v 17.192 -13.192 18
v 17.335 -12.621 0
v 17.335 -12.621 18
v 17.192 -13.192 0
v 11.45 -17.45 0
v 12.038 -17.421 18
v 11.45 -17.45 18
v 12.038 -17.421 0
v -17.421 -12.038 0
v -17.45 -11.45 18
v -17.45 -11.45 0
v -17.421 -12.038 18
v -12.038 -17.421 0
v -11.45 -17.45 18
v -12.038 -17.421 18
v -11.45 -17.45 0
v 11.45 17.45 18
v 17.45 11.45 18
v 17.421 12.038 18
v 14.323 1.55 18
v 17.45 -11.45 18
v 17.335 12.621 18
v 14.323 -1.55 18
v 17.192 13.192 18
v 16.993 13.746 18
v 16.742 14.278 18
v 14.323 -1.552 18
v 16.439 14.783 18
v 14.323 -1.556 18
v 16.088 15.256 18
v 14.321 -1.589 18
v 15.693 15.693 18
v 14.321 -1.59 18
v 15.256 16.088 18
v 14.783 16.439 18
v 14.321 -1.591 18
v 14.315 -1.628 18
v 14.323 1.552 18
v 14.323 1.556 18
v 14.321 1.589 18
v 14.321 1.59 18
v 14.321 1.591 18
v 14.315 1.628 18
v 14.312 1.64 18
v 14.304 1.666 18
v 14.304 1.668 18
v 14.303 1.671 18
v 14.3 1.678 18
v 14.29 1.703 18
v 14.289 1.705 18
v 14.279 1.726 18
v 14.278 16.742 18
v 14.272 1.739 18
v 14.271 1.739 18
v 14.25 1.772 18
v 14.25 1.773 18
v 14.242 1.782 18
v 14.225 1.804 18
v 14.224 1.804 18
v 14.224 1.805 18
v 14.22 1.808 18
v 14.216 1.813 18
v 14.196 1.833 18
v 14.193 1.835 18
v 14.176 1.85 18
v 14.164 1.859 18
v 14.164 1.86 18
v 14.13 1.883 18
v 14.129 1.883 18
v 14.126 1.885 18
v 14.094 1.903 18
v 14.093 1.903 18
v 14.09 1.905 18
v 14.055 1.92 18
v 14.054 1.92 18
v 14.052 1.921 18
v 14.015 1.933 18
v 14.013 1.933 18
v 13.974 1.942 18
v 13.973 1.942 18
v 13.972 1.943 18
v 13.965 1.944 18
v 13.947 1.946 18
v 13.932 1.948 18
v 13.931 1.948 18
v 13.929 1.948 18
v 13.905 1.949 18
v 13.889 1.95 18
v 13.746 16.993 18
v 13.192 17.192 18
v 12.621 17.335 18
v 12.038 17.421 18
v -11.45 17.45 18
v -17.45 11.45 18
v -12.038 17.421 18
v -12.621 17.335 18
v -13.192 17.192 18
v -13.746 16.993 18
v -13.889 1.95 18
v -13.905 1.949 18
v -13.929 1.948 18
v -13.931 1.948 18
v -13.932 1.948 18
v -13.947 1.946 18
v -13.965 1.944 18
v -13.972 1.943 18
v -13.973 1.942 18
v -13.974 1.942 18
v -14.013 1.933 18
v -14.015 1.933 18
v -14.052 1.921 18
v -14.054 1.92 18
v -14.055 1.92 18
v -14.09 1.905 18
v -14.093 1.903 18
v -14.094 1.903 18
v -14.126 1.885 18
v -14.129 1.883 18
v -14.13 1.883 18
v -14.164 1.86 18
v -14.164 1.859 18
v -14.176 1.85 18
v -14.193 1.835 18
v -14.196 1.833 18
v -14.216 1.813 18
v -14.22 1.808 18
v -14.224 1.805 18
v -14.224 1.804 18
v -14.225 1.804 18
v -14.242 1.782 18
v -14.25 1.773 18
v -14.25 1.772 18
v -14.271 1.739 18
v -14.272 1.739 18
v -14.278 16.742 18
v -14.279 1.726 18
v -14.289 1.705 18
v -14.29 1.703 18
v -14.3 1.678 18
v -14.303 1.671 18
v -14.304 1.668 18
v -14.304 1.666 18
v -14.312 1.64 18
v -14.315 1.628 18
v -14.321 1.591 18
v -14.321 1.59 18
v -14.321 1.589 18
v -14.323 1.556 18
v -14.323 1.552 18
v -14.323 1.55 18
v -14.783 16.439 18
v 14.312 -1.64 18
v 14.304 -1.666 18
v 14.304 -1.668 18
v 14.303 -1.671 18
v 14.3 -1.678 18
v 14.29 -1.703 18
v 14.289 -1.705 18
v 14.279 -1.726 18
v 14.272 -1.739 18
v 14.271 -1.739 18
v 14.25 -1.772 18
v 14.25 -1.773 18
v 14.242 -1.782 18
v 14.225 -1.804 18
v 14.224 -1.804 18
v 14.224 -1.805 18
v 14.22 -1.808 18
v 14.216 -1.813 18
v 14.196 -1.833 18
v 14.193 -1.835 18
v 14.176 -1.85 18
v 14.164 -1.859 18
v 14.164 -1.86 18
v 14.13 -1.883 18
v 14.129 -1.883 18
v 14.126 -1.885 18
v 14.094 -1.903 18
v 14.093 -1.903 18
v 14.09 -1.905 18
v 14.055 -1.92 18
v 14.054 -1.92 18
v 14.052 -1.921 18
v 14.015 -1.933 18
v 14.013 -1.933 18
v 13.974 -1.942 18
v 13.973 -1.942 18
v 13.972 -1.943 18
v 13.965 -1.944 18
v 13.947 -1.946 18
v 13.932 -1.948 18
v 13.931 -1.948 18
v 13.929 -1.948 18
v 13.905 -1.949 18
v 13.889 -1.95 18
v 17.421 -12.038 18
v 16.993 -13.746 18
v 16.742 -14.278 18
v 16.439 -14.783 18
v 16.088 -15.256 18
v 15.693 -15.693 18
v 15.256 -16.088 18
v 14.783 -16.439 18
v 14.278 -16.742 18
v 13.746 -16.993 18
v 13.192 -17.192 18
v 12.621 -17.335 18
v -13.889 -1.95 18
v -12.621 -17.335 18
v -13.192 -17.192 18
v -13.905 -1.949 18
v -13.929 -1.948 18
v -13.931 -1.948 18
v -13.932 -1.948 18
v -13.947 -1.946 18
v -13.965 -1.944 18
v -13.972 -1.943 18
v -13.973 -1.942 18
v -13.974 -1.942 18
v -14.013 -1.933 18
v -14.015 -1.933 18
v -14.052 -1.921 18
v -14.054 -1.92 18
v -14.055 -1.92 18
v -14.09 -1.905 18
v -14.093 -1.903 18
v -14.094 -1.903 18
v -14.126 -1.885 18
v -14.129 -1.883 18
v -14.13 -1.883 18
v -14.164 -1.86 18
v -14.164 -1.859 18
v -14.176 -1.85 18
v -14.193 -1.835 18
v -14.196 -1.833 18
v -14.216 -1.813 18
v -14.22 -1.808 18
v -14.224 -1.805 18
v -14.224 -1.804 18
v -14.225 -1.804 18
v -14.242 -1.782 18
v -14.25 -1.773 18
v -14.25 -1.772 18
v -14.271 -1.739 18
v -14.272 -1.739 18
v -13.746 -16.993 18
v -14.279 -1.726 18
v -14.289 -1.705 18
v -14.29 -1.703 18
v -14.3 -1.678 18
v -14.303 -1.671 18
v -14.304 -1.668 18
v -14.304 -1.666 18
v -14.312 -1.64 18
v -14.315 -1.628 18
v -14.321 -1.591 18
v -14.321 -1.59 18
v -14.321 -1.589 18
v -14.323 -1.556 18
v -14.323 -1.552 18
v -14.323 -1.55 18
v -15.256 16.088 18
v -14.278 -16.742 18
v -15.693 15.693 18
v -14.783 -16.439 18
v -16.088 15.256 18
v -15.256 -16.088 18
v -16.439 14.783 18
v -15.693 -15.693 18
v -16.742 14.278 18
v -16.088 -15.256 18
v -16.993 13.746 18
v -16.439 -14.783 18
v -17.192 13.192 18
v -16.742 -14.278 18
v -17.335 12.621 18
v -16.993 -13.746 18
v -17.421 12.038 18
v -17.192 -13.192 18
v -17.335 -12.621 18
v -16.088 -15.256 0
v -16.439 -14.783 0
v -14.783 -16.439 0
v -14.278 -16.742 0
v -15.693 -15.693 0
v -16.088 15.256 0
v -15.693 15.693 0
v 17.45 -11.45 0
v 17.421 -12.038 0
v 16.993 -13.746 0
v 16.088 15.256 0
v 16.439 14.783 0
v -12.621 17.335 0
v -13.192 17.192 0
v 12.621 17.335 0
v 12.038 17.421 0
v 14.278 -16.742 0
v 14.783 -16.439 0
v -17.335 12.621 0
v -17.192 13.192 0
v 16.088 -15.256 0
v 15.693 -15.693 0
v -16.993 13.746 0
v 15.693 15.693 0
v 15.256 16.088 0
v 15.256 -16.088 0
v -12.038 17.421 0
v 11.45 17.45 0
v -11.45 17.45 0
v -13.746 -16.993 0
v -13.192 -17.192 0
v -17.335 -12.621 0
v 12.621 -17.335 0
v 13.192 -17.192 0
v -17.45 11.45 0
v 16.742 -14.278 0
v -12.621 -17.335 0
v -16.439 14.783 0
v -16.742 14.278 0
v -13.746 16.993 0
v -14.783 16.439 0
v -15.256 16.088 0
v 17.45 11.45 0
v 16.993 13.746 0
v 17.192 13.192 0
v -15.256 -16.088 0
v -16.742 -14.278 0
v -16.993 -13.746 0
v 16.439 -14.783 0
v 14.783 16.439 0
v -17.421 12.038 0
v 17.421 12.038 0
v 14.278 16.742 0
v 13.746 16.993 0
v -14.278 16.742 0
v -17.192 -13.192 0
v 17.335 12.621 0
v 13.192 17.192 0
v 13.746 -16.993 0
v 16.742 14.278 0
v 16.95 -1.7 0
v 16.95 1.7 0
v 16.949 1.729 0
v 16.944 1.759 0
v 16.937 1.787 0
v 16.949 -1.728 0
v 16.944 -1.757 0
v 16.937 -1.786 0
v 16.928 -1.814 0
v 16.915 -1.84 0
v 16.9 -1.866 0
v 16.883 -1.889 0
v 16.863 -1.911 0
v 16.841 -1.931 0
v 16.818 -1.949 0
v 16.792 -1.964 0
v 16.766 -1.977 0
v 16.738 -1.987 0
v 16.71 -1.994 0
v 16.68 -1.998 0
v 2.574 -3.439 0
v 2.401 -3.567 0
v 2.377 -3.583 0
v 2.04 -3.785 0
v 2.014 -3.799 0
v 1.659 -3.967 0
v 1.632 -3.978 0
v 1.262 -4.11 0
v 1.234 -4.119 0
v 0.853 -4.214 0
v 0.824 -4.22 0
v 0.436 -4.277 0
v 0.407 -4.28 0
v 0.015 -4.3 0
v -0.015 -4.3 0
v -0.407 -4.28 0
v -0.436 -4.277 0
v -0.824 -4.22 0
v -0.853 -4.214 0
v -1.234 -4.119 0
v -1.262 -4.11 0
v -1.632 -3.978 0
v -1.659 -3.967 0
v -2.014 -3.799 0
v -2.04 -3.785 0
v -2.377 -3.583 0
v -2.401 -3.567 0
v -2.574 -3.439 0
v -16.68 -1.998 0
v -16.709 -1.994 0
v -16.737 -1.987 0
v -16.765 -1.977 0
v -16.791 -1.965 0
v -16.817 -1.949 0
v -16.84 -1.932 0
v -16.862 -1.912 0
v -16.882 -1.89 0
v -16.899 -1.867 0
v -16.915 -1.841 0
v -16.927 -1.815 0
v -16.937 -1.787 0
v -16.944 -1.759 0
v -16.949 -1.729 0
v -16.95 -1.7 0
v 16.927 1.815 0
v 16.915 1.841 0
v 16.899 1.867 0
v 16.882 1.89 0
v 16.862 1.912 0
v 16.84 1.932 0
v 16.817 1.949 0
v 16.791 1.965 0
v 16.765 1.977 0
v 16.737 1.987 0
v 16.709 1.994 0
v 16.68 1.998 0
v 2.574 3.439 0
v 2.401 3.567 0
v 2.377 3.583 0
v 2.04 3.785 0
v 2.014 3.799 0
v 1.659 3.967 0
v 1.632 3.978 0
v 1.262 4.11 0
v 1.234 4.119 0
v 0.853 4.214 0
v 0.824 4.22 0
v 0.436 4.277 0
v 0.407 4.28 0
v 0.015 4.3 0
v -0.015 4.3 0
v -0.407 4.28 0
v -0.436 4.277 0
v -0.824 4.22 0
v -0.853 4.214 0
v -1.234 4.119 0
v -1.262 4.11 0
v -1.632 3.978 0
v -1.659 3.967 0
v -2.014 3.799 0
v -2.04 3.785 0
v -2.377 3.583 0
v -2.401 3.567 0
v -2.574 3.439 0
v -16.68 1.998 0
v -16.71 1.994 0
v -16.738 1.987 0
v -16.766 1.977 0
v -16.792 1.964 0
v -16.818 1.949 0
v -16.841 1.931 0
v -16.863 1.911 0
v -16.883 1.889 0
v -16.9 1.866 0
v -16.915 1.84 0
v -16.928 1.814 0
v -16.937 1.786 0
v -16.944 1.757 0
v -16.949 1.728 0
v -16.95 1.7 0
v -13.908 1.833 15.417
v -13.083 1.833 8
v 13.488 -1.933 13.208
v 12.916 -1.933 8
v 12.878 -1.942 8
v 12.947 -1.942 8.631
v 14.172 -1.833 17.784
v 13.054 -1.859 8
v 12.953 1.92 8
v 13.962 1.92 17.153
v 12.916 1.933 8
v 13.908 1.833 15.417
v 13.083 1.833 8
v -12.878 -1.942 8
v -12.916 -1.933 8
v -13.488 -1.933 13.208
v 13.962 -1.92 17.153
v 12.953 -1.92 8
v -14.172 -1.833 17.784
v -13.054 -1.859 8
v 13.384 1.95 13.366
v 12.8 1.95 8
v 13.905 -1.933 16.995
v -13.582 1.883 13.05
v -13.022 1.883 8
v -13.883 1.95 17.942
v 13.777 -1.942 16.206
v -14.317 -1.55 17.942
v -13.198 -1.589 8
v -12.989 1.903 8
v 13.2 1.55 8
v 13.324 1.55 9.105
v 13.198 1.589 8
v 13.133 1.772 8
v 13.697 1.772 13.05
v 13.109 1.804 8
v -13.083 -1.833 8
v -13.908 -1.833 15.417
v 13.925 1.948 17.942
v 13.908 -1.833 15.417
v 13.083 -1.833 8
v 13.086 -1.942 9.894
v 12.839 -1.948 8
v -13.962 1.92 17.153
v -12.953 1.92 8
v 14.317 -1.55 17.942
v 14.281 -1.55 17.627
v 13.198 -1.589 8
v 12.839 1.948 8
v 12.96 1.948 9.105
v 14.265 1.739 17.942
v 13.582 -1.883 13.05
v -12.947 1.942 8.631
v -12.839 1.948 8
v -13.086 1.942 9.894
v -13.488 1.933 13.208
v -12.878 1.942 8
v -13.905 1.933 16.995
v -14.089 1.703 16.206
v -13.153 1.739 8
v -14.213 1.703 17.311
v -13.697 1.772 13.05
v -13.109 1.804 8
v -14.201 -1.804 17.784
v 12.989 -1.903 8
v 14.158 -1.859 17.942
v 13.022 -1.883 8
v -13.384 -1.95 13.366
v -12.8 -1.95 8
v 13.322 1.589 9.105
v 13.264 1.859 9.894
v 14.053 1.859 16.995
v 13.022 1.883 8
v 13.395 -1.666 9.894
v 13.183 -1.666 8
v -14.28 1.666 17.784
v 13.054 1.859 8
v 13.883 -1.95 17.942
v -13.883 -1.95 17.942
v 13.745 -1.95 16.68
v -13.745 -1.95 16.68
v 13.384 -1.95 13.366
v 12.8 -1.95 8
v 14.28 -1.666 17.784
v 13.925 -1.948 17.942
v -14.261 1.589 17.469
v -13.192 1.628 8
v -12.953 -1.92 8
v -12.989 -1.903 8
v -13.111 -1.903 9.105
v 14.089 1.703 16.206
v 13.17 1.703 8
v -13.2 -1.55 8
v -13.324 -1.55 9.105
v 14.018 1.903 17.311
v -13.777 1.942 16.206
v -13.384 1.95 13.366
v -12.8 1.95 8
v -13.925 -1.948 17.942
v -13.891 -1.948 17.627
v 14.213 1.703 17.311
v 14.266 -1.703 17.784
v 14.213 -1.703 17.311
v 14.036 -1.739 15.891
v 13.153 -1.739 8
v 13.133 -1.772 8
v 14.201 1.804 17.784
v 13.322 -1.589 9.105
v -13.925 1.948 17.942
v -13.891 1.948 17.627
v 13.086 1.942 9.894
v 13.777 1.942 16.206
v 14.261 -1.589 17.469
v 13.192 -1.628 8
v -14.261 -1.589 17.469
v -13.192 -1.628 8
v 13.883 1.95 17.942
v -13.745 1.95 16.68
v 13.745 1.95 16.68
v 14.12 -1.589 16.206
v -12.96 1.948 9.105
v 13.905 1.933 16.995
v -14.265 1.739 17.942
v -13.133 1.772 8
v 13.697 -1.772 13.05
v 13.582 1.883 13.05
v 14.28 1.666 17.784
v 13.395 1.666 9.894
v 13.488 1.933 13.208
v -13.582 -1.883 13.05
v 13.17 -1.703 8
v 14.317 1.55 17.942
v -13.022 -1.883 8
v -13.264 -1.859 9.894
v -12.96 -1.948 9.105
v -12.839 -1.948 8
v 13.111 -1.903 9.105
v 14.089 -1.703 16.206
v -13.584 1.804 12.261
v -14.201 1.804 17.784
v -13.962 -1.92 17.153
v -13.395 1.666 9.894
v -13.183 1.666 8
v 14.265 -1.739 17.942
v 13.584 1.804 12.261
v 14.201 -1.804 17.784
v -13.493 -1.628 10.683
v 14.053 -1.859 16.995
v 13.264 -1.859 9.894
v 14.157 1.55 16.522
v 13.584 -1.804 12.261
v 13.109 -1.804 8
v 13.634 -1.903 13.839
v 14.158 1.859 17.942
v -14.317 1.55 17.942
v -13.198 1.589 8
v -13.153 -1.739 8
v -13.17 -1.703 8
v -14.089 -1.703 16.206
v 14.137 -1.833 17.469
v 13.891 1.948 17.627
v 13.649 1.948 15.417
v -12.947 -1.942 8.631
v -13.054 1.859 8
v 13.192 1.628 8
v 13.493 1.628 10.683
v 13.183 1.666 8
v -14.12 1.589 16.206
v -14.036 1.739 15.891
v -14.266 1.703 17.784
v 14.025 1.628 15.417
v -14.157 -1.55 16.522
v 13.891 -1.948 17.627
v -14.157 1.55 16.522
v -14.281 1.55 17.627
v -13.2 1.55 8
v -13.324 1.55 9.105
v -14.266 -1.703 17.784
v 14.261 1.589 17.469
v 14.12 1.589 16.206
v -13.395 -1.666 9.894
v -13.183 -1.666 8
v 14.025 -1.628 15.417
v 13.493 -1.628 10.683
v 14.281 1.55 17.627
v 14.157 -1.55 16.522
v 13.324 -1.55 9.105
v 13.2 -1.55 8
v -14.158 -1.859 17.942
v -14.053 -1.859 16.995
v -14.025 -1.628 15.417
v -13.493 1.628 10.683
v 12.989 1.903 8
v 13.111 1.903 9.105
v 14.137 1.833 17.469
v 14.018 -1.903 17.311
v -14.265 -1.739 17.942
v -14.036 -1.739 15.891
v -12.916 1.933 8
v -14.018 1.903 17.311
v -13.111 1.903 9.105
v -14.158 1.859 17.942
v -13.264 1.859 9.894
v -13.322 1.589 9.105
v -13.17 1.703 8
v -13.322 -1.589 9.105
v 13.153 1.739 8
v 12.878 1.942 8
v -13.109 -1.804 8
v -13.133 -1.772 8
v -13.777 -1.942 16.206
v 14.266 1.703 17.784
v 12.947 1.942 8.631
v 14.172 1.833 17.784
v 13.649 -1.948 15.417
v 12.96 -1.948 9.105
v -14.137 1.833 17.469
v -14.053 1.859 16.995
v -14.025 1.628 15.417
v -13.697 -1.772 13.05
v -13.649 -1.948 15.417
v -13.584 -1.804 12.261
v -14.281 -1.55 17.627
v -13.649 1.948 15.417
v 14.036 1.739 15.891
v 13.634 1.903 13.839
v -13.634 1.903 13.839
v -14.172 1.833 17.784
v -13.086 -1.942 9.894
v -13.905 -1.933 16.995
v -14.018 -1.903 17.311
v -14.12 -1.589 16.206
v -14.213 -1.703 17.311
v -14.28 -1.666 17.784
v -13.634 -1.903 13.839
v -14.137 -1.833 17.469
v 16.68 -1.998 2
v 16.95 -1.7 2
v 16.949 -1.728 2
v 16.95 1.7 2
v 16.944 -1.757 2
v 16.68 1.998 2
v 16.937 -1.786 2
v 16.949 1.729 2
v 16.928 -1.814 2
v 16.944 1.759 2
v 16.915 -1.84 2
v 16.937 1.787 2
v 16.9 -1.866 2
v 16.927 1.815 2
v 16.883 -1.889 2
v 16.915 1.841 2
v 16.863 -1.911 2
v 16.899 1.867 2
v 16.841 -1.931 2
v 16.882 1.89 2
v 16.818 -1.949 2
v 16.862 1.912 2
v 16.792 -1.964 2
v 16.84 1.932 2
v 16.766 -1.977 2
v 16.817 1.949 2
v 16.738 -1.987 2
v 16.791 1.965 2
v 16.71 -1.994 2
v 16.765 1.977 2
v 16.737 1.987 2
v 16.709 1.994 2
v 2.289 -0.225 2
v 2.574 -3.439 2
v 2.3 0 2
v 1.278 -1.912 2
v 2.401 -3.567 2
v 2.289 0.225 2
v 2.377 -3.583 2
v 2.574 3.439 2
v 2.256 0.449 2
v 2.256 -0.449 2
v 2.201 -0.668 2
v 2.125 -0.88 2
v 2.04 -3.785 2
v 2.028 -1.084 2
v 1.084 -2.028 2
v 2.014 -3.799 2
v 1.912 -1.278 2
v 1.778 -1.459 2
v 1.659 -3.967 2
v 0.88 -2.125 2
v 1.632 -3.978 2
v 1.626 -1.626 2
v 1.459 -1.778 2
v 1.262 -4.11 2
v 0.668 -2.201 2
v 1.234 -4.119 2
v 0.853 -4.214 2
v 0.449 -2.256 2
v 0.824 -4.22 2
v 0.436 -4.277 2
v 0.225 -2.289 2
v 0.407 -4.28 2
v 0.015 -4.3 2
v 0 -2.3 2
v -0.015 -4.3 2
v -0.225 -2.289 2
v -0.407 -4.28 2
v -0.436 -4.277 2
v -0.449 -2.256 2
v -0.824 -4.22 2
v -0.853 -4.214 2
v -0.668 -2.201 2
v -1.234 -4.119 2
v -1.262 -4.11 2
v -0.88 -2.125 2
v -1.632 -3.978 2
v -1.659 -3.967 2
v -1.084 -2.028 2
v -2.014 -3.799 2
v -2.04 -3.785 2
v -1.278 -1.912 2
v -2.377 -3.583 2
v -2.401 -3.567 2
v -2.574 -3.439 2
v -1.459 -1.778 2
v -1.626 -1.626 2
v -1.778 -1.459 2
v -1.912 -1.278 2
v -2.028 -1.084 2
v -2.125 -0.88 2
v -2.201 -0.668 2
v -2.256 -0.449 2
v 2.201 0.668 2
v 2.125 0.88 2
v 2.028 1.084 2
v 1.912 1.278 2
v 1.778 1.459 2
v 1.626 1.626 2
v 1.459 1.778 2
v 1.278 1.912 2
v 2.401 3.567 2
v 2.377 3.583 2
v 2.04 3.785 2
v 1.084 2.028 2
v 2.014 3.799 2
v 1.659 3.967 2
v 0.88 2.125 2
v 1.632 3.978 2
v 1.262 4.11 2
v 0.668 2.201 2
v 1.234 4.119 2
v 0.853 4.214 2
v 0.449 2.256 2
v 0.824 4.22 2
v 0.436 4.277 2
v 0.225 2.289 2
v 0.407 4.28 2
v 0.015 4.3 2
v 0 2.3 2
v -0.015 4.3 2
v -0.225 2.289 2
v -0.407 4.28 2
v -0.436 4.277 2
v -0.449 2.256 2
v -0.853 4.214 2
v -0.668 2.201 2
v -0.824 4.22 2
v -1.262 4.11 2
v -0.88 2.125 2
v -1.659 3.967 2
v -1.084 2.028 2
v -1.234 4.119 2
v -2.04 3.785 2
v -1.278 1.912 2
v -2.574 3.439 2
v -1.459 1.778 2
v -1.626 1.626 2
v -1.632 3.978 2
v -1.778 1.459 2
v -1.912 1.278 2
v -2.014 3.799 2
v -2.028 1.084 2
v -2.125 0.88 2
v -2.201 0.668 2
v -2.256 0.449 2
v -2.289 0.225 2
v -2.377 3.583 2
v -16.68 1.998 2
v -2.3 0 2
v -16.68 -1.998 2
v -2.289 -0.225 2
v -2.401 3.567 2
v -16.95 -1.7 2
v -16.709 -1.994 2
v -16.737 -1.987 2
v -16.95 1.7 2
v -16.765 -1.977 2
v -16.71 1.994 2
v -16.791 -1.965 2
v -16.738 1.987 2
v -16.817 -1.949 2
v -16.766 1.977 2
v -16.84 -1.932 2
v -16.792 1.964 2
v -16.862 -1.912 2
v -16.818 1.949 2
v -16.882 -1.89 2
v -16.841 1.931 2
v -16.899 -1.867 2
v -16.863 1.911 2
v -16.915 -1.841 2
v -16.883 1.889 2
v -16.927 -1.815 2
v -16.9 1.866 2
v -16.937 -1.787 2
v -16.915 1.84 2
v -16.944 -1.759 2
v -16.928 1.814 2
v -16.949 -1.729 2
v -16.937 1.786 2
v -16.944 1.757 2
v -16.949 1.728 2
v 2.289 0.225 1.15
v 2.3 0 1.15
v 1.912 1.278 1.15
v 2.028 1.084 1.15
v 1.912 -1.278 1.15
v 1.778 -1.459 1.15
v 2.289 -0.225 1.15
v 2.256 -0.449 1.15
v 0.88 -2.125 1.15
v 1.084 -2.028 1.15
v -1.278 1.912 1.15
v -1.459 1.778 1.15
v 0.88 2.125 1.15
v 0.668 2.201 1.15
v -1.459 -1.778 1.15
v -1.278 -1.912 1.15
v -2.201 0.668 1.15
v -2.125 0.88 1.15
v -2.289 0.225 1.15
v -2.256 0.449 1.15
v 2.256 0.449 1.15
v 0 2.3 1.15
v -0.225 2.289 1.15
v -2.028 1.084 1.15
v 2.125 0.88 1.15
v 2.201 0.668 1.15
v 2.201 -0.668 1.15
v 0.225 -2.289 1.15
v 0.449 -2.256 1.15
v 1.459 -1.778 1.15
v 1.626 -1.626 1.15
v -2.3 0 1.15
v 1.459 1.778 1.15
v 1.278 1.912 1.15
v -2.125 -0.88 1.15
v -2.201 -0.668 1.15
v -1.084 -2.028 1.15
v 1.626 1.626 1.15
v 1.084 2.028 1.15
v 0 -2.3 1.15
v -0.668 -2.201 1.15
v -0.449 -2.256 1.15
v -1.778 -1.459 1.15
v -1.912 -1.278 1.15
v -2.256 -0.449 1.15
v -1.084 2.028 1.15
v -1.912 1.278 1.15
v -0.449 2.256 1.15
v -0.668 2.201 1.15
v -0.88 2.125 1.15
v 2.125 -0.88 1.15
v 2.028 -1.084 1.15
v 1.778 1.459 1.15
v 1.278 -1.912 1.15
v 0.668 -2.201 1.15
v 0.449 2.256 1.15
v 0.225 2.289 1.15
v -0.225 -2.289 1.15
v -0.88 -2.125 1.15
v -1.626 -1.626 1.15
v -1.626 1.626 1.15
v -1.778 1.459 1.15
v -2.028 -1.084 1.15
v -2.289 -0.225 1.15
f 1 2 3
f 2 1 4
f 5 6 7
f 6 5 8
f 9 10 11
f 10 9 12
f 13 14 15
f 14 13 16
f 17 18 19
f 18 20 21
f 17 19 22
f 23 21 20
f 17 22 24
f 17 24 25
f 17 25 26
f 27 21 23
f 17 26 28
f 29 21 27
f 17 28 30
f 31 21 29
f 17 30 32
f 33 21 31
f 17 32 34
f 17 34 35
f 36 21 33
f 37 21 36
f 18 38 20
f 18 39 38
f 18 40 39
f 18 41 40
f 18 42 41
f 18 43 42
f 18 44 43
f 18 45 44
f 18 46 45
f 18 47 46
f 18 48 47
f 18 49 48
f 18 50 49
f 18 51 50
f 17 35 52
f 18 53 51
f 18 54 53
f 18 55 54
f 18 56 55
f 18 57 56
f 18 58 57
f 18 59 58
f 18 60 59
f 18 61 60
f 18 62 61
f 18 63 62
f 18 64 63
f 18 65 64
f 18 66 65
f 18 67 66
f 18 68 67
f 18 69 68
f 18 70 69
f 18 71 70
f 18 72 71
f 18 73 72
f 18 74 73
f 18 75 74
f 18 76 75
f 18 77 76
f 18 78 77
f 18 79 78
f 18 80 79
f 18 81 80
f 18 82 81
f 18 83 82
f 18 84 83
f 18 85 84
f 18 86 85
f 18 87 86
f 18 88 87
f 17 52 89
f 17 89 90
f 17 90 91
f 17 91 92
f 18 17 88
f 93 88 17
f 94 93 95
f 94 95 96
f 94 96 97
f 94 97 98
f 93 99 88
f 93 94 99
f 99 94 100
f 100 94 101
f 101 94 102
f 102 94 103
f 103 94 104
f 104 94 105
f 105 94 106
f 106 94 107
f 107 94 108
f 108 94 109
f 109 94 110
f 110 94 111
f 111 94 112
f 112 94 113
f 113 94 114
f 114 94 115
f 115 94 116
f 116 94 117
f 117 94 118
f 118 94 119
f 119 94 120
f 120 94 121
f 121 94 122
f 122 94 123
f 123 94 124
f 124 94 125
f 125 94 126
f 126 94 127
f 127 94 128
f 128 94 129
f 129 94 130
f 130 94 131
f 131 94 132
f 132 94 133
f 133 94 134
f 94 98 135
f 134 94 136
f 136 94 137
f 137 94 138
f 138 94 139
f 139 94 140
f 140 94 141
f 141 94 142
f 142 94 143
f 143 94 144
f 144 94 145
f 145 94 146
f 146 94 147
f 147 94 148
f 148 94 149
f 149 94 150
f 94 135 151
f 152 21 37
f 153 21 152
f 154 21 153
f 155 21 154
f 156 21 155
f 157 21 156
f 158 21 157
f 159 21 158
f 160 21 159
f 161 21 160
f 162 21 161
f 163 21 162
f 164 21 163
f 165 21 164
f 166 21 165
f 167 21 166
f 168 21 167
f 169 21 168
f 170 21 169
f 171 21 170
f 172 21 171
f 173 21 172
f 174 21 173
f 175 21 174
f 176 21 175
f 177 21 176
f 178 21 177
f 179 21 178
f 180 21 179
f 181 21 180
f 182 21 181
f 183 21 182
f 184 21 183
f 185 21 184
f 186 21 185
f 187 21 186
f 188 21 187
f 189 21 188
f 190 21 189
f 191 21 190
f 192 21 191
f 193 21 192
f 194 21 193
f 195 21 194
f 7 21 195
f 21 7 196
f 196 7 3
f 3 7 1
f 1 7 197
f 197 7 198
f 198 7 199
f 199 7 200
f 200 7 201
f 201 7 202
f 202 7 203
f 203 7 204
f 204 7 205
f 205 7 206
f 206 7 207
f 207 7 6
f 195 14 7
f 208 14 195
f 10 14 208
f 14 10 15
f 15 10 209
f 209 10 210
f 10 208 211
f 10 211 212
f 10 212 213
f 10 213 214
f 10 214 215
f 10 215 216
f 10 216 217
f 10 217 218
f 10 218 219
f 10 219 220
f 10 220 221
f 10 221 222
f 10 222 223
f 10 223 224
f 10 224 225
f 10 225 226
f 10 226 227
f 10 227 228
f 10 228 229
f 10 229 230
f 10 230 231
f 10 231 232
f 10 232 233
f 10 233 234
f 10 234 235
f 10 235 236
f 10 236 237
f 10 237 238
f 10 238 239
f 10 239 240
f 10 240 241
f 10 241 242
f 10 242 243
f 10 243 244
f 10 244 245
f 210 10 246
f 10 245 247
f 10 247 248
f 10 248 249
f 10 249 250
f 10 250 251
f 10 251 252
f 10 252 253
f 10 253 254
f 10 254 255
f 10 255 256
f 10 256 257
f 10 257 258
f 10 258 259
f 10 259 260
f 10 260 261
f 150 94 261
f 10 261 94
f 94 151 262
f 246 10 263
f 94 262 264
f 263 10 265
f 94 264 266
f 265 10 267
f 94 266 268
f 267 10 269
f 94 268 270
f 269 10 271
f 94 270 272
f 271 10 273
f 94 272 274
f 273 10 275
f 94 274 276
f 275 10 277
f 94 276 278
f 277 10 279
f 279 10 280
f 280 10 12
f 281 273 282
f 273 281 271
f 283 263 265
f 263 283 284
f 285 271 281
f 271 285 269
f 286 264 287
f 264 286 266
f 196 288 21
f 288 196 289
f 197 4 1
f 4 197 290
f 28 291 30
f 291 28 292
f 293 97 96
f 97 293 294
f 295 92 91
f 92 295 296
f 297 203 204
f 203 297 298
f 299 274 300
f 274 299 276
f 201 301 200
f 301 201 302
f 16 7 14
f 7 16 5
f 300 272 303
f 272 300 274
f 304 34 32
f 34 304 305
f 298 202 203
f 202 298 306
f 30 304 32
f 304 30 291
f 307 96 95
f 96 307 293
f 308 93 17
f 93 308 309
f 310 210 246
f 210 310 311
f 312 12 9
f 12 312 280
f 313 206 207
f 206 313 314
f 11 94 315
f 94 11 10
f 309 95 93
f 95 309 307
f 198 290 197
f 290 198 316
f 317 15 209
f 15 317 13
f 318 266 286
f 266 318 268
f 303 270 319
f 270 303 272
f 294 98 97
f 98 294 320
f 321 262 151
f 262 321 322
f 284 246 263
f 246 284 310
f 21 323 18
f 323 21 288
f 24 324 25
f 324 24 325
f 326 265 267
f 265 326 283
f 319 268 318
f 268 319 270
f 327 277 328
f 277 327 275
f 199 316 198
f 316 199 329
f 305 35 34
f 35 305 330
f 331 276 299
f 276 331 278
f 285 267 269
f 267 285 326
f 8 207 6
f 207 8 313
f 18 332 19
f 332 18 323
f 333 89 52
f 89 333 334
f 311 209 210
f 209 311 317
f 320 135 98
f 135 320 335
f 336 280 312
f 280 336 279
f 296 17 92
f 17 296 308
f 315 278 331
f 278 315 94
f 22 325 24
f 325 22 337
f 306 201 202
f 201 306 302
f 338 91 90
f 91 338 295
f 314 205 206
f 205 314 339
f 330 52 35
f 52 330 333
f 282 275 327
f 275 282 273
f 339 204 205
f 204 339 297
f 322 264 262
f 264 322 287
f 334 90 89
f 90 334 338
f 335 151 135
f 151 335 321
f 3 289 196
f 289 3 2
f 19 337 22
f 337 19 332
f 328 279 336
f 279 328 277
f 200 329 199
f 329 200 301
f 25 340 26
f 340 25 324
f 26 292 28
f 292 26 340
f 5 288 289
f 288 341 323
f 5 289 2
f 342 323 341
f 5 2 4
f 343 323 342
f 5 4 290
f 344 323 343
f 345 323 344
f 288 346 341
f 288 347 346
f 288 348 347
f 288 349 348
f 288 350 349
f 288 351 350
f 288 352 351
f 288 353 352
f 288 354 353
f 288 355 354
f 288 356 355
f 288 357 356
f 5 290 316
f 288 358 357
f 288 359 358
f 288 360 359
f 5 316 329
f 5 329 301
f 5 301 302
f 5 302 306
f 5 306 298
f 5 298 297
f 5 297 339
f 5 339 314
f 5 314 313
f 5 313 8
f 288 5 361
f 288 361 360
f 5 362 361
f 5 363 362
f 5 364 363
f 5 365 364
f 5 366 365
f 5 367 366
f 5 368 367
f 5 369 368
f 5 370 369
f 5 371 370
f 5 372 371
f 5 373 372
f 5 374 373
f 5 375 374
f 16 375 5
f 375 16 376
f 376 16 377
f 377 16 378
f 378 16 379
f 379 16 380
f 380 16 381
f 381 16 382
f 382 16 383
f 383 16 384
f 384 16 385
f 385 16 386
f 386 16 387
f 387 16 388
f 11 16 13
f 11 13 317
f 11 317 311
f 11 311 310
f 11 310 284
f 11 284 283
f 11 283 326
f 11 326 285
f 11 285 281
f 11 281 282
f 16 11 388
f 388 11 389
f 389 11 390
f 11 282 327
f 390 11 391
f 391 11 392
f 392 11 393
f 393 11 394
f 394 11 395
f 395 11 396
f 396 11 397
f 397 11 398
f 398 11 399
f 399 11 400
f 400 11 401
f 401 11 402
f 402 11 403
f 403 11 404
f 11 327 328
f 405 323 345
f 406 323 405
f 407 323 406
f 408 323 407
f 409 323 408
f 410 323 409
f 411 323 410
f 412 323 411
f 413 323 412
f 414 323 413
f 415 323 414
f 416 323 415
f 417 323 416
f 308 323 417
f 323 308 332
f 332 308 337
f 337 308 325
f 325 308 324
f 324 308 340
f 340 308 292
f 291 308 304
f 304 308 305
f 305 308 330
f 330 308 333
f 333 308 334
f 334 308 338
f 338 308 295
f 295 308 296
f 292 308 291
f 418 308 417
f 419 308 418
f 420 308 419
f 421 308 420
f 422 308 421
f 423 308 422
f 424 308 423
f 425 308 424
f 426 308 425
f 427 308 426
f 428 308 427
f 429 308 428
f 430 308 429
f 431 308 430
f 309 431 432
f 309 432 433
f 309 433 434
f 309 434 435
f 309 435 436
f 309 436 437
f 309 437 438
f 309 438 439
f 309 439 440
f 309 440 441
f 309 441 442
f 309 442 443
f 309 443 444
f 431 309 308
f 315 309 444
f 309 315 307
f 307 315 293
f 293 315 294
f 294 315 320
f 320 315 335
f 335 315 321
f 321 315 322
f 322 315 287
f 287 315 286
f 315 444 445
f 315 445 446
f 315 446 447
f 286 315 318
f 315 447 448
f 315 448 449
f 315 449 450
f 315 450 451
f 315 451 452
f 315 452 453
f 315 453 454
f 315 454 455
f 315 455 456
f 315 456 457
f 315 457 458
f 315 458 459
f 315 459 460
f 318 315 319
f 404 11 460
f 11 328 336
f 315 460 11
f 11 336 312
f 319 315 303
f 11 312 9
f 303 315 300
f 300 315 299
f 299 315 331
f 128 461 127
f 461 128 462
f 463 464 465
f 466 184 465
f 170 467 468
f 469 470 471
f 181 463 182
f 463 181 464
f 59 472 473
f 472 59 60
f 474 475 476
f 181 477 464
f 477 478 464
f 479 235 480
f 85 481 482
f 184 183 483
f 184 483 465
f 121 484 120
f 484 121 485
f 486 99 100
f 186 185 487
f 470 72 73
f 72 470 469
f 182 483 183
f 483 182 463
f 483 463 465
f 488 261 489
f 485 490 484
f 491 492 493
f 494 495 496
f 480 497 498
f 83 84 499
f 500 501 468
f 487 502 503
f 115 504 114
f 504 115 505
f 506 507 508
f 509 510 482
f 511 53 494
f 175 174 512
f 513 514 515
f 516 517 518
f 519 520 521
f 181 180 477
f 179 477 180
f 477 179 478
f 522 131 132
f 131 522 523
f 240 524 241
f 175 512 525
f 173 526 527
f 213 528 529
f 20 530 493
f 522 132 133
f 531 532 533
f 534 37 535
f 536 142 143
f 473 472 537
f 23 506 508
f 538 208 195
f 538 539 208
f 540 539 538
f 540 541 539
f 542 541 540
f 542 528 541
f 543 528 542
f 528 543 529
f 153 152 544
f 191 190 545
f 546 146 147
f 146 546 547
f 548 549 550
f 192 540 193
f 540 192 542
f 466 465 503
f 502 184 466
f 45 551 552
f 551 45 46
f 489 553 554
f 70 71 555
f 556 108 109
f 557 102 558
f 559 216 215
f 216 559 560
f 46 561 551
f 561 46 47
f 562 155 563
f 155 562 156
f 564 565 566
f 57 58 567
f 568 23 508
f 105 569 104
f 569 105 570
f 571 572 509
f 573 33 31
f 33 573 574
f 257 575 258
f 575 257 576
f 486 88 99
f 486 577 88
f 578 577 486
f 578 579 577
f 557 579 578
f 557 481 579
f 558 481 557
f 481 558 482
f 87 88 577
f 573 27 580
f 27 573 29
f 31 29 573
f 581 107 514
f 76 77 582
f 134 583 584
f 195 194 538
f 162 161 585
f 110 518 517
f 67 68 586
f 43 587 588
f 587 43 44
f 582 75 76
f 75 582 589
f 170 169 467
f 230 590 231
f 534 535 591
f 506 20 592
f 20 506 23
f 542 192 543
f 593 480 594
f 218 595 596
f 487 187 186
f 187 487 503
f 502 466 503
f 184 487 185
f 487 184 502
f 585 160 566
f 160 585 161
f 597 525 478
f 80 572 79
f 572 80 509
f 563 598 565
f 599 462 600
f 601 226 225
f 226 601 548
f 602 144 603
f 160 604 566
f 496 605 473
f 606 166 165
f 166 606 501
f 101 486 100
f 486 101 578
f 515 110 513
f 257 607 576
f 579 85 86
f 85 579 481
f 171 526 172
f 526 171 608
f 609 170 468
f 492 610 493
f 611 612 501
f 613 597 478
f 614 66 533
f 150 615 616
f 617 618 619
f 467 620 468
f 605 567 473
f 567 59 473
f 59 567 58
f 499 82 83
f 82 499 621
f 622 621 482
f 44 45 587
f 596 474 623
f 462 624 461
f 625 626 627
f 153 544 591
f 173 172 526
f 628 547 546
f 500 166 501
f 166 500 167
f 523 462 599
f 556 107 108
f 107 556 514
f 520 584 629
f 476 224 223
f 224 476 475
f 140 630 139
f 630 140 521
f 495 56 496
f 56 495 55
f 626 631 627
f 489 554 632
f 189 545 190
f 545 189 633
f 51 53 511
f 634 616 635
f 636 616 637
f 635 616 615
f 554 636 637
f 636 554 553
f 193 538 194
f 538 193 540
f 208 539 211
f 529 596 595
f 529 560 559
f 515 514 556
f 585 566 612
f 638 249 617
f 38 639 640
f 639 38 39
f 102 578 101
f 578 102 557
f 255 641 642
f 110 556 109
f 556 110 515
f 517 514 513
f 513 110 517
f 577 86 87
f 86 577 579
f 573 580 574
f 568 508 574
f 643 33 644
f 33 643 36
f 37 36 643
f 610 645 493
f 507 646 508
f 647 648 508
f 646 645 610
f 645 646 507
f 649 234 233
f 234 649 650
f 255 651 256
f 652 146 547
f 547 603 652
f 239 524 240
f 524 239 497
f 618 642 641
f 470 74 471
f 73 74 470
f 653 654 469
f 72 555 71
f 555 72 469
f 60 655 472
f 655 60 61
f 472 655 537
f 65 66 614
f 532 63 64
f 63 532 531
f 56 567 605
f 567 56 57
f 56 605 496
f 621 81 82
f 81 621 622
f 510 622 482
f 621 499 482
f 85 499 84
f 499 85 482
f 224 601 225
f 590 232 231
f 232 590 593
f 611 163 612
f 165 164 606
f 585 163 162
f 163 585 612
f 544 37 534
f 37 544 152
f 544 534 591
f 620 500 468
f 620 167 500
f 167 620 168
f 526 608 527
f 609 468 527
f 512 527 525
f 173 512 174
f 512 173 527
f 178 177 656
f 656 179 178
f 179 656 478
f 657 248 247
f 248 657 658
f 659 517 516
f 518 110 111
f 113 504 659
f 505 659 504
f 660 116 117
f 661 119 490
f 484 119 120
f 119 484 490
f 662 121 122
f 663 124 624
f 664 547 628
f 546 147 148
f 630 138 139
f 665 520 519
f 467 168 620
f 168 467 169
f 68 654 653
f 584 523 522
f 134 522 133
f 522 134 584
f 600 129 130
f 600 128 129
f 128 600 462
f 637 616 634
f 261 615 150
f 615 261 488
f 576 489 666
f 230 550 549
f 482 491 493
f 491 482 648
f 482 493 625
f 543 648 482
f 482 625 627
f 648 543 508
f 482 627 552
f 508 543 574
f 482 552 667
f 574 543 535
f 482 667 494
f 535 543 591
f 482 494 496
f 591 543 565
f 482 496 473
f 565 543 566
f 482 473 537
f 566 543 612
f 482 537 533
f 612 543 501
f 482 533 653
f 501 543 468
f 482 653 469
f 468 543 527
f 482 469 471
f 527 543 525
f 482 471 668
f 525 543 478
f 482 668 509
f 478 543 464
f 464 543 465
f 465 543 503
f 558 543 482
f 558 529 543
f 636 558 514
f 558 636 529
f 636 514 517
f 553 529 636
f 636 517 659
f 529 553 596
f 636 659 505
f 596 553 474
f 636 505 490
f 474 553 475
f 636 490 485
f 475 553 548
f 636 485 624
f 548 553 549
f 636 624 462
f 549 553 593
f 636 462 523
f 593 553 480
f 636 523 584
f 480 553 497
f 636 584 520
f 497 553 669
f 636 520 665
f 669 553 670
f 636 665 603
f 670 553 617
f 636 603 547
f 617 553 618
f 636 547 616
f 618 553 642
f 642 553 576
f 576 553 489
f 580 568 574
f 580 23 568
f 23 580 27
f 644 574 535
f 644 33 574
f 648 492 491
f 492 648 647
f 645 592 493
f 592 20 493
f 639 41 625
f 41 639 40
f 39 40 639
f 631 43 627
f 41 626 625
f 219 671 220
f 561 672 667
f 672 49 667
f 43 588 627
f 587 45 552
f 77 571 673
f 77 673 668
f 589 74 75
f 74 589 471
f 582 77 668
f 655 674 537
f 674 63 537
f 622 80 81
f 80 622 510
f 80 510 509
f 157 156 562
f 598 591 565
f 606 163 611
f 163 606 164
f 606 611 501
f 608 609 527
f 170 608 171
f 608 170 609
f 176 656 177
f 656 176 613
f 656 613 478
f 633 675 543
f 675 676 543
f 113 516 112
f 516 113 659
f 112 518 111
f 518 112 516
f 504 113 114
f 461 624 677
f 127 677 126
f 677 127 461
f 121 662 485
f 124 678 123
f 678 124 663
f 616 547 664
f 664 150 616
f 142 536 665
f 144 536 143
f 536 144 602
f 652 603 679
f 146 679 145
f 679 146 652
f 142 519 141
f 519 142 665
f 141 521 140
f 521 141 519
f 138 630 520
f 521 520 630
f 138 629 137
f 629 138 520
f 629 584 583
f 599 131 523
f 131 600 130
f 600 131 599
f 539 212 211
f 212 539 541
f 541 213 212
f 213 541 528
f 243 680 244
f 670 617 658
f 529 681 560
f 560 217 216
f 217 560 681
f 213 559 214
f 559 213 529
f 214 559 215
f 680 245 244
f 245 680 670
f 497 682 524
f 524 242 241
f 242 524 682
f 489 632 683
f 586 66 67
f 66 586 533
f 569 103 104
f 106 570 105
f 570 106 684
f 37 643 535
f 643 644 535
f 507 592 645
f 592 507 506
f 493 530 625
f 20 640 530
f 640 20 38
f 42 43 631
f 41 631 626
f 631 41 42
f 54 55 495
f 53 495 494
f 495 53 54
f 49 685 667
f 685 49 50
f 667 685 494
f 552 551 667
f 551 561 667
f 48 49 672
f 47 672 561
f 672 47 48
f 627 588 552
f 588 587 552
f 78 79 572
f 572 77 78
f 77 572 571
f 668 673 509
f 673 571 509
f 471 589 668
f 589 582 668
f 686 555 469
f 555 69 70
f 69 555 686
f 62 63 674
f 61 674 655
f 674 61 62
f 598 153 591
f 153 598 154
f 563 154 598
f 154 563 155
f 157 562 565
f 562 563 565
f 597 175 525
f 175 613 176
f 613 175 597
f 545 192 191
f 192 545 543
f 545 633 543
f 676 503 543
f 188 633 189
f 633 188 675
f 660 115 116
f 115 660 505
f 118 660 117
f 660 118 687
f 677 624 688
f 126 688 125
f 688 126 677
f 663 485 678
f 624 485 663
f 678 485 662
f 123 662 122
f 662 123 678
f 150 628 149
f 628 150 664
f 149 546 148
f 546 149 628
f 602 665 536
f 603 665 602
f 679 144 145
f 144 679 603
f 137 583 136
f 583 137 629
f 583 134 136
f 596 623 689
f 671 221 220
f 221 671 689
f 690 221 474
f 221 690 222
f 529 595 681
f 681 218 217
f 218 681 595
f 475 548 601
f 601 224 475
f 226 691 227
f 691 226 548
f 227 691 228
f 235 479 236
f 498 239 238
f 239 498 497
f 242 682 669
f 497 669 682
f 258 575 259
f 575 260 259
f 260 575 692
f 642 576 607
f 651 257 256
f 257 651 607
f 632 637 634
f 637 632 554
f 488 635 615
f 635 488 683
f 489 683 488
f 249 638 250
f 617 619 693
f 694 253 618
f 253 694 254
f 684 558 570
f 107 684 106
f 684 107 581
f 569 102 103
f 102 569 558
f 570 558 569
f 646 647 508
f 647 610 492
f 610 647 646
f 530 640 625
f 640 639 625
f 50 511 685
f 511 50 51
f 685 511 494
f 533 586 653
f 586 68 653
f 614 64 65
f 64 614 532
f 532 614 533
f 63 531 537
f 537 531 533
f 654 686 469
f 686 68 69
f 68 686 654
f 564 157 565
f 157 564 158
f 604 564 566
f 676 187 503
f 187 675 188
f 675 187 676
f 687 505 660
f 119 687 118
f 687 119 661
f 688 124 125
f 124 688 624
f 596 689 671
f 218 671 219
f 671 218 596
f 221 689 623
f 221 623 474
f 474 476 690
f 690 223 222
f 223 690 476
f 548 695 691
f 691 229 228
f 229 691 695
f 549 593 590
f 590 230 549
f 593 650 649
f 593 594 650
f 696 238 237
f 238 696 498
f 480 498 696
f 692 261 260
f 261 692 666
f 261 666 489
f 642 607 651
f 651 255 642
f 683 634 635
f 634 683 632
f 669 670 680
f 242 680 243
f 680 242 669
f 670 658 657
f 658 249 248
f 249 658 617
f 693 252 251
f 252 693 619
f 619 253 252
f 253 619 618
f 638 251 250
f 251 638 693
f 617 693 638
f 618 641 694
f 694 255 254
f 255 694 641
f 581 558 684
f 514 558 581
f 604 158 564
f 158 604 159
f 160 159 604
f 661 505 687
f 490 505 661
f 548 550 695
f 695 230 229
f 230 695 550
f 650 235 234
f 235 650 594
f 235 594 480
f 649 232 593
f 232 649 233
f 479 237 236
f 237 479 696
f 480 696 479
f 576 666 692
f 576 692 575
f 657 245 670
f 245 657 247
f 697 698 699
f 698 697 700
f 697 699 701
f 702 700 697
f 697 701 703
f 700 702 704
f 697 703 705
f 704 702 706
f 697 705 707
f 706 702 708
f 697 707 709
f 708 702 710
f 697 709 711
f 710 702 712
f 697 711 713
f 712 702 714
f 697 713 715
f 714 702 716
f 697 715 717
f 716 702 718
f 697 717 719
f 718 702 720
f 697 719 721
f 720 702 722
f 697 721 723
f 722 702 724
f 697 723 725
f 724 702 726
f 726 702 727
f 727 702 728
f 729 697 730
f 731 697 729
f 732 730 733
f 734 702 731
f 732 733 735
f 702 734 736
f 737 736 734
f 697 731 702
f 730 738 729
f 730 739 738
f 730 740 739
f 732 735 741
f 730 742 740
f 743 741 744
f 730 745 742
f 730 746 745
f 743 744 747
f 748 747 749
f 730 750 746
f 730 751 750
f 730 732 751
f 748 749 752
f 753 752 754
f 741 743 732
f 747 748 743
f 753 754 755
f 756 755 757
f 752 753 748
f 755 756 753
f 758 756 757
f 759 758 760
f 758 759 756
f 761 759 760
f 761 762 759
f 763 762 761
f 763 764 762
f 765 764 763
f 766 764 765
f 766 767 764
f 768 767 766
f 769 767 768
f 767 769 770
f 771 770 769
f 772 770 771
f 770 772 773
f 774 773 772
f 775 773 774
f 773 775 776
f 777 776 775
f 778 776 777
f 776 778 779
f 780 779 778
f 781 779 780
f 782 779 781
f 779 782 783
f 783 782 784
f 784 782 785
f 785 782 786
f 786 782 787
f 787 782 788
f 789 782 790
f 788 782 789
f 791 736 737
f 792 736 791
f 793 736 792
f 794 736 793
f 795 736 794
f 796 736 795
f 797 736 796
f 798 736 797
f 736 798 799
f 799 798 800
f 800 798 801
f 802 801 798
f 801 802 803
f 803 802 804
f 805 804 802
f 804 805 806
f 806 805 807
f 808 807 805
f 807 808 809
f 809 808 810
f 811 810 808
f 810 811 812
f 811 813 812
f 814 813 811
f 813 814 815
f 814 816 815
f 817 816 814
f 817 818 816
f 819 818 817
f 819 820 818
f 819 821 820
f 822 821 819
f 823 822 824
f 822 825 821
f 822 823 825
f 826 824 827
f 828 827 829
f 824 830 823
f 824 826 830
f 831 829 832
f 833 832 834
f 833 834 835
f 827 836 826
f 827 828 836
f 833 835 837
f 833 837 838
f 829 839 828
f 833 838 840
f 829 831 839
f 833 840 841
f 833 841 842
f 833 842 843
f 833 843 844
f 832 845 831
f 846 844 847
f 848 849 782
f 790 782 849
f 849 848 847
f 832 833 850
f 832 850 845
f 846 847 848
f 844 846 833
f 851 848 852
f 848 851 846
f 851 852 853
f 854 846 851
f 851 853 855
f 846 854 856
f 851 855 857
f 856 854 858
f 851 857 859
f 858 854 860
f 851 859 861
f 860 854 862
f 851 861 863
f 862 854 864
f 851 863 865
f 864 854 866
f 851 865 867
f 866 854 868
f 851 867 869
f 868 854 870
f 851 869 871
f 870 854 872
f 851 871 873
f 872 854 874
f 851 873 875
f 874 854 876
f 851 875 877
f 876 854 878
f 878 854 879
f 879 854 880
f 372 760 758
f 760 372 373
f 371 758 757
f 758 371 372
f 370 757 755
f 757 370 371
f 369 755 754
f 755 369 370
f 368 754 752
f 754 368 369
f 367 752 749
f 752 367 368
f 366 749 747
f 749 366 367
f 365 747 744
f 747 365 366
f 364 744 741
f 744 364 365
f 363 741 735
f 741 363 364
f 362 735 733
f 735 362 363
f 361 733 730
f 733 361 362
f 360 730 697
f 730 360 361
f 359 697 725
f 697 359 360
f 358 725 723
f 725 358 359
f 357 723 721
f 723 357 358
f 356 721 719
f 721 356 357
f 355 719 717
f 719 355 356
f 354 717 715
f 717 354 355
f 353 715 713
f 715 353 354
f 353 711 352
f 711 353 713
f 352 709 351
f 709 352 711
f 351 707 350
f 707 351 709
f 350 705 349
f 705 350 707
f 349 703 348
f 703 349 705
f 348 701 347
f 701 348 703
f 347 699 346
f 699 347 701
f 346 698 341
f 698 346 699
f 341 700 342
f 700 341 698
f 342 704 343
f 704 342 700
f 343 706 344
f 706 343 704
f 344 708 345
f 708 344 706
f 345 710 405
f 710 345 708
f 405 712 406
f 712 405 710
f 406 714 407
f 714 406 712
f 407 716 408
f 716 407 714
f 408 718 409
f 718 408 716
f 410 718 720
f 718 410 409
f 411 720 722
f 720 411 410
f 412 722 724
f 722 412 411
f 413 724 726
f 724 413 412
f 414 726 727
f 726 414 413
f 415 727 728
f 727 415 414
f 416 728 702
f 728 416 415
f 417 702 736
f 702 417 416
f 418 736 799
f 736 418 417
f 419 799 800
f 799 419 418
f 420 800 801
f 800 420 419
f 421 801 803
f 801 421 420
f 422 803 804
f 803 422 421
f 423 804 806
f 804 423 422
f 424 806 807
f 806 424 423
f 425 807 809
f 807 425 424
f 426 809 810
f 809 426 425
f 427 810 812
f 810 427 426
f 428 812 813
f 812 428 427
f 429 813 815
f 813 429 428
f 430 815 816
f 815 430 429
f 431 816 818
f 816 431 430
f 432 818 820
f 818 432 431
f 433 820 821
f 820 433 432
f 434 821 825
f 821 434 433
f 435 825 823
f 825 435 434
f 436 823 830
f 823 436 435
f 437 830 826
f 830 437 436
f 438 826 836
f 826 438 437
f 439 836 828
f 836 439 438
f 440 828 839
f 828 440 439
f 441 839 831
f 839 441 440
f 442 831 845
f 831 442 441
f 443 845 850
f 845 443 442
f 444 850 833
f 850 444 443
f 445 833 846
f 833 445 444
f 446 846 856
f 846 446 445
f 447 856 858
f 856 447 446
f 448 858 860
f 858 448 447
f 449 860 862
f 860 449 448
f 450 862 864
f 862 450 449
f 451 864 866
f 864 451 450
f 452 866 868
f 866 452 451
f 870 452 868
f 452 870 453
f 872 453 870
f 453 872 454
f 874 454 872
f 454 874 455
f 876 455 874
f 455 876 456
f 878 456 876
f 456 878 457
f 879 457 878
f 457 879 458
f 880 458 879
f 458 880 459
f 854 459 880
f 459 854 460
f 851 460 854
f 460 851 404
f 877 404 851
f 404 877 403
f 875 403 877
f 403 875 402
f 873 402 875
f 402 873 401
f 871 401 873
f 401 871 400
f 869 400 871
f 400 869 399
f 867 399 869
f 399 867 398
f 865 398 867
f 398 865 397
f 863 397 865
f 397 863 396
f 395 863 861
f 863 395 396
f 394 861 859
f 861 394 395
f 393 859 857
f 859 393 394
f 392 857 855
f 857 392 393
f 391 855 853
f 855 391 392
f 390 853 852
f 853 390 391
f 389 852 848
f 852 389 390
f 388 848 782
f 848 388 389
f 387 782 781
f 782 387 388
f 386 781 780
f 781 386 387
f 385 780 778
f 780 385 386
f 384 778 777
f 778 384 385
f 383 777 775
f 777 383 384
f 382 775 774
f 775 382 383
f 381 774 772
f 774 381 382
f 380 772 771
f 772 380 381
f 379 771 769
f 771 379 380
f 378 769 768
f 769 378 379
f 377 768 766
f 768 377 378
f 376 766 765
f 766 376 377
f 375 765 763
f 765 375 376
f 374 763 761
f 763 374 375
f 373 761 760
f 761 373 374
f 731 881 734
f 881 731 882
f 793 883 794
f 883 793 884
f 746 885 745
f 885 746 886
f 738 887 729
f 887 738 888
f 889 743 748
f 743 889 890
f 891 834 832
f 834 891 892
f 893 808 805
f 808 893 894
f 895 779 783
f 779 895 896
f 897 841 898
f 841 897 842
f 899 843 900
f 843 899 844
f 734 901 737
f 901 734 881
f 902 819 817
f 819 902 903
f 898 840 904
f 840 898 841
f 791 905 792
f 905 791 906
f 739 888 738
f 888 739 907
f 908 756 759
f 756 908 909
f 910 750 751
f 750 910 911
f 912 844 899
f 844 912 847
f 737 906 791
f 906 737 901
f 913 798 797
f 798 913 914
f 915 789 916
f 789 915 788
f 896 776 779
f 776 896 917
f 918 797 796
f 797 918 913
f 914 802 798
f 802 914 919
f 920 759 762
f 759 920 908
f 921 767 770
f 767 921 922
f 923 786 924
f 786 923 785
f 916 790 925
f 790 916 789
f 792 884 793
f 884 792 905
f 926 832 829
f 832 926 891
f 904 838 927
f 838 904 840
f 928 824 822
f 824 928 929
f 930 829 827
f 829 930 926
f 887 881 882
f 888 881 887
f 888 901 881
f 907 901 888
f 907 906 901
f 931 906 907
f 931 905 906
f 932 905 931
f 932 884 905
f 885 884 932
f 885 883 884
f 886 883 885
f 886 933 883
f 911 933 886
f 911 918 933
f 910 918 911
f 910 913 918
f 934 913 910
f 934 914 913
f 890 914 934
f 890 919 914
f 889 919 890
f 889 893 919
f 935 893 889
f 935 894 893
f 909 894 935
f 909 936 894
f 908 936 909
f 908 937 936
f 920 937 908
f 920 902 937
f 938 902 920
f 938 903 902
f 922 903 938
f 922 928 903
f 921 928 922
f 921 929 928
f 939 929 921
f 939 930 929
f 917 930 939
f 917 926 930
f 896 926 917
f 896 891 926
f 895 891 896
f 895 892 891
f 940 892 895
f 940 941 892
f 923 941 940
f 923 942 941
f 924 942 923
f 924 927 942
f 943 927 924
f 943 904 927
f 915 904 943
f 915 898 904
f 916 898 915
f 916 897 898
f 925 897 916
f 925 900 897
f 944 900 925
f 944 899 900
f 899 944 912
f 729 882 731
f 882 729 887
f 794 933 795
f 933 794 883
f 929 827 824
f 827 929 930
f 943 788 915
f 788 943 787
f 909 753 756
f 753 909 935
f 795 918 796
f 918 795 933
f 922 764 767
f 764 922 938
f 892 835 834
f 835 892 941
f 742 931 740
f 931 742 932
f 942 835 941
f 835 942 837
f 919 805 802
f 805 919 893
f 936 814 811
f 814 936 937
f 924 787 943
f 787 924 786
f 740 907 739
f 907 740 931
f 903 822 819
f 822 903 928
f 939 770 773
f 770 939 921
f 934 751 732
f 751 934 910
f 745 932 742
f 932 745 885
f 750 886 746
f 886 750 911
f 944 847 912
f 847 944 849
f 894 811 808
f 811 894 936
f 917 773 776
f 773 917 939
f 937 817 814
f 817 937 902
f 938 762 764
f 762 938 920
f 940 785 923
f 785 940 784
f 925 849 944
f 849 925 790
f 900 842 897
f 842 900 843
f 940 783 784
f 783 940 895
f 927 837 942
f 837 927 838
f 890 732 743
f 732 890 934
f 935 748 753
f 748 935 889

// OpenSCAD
// file: ../scad/socket.scad
include <params.scad>

// Thumb-turn socket. Knob pocket on top (+Z) tapers from the tip (deep) to the
// base (opening); servo shaft bore on the bottom (-Z).
module thumbturn_socket() {
  c   = fit_clearance;
  hc  = horn_clearance;
  // outer footprint is knob-driven and capped so the R6-rounded body still clears the
  // pedestal bore (~rosette_d). The horn cross-slot (33.3mm) just fits inside this.
  ow  = knob_w_base + knob_t + 2*socket_wall;
  difference() {
    // outer body: rounded square prism (R=6 for pedestal clearance)
    linear_extrude(height = socket_oh)
      offset(r = 6) offset(r = -6)
        square([ow, ow], center = true);
    // tapered knob pocket: base (knob_w_base) at the top opening, narrowing to
    // the tip (knob_w_top) at depth. Built tip-square at bottom, scaled up to base.
    translate([0, 0, socket_oh - knob_engage])
      linear_extrude(height = knob_engage + 0.1, scale = [knob_w_base/knob_w_top, 1])
        offset(r = c) square([knob_w_top, knob_t], center = true);
    // horn bar pocket: single tapered bar + hub circle (bottom face = shaft side)
    translate([0, 0, -0.1]) {
      linear_extrude(height = horn_thick + hc + 0.1)
        offset(r = hc)
          union() {
            polygon([
              [-horn_arm_l, -horn_arm_w_tip/2],
              [          0, -horn_arm_w_base/2],
              [ horn_arm_l, -horn_arm_w_tip/2],
              [ horn_arm_l,  horn_arm_w_tip/2],
              [          0,  horn_arm_w_base/2],
              [-horn_arm_l,  horn_arm_w_tip/2]
            ]);
            circle(d = horn_hub_d);
          }
    }
  }
  // center registration stub: a nub protruding from the pocket floor (~half the horn
  // thickness) that nests into the horn's central recess (horn_stub_d, measured) to
  // stop the horn shifting up/down/left/right. No center retaining screw is used.
  translate([0, 0, (horn_thick + hc) - horn_thick/2])
    cylinder(d = horn_stub_d, h = horn_thick/2 + 0.1);
}
// file: ../scad/params.scad
// ===== Smart lock enclosure parameters (mm) =====

// --- Print / fit ---
wall          = 2.4;
fit_clearance = 0.4;
$fn           = 64;
box_corner_r  = 3;      // outer shell corner fillet radius
lid_lip_h     = 4;      // lid inner-lip depth

// --- SG90 servo (datasheet nominal) ---
servo_body_l  = 22.8;
servo_body_w  = 12.2;
servo_body_h  = 22.5;
servo_tab_l   = 32.2;   // length across mounting tabs
servo_tab_h   = 2.5;
servo_shaft_d = 4.8;    // output boss / horn clearance
servo_screw_span  = 27.6;  // 耳のネジ穴 中心間（データシート公称・要実測補正）
servo_screw_pilot = 1.8;   // M2 セルフタッピング下穴径
servo_boss_d      = 4.5;   // 耳ボス外径（Pico ボスと同径。ポケット/タブ干渉を回避）
servo_boss_h      = 4.5;   // pedestal_top からの耳ボス高さ。実効ネジ噛み合いは sg90_cutout のタブスロット(Z≈22.6..25.9)がボス(Z≈23..27.5)を削るため上側 ~1.6mm のみ。M2 には浅く、ボス配置ごと要実測・要設計見直し

// --- SG90 cross horn (付属十字ホーン, 実測反映済み) ---
horn_arm_l      = 16.65;    // 腕の長さ 中心→先端（実測: 横腕 全長 33.3mm の半分）
horn_arm_w_base = 6.8;      // 腕幅 中心側（最も広い, 実測4.8+2.0補正）
horn_arm_w_tip  = 3.4;      // 腕幅 先端側（最も狭い, 実測）
horn_hub_d      = 8.0;      // 中央ハブ外径（実測6.0+2.0補正）
horn_thick      = 1.7;      // ホーン厚 Z方向の押し出し深さ（実測）
horn_clearance  = 0.3;      // ホーンポケット専用クリアランス (fit_clearance とは独立)
horn_stub_d     = 4.6;      // 中心突起の径。ホーン socket 側の中心くぼみ(実測≈4.6mm)へ嵌合させ上下左右ズレを止める
// 抜け止めネジは不要（軸方向はドア↔サーボ間でソケットが挟持されるため）。回り止めは十字ポケットのキー嵌合＋中心突起で担う。

// --- Raspberry Pi Pico W ---
pico_l        = 51.0;
pico_w        = 21.0;
pico_h        = 1.0;
pico_hole_d   = 2.1;
pico_hole_dx  = 47.0;   // mounting hole spacing along length
pico_hole_dy  = 11.4;   // mounting hole spacing across width
pico_boss_d   = 4.5;
pico_boss_h   = 3.0;

// --- USB micro-B connector (Pico W) ---
usb_w           = 9.0;
usb_h           = 6.0;
usb_connector_h = 2.6;   // connector body height above PCB (measured)

// --- Indicators ---
led_hole_d    = 5.2;
button_hole_d = 6.2;
led_btn_spacing = 16;   // center-to-center distance between LED and button

// --- Door-fit clearances from the thumb-turn axis (origin = rosette center) ---
clear_left  = 50;   // -X to door edge/frame（実測: ~50 未満の上限。精密値は未確定）
clear_down  = 65;   // -Y to door handle（実測: ~65 未満の上限。精密値は未確定）
rosette_d   = 45;   // circular escutcheon diameter (registration only)（実測）

// --- Thumb-turn knob (measured; trapezoid) ---
knob_w_base = 27.8;  // width at the door (base, wider)（実測）
knob_w_top  = 25.6;  // width at the tip (narrower)（実測）
knob_t      = 3.1;   // thickness（実測）
knob_h      = 30;    // protrusion from the door（実測: 仮値 11 から大幅増→台座が背高に）
knob_engage = 10;    // socket engagement depth (< knob_h)（実測）
socket_wall = 2.0;

// --- Servo horn + pedestal ---
horn_h            = 4;      // horn thickness + clearance between socket top and servo tabs
socket_oh         = knob_engage + socket_wall + 6;   // socket total height (18)
pedestal_top_z    = (knob_h - knob_engage) + socket_oh + horn_h;  // 42: servo tabs rest here
pedestal_wall_t   = 2.5;    // pedestal wall thickness
wire_clearance    = 4;      // space above servo for wiring

// --- Universal board (stacked on Pico via pin headers) ---
uboard_l = 72;    // long side (along Pico pin direction = Y)
uboard_w = 47;    // short side (across Pico width = X)

// --- Interior extents from the axis at origin (mm) ---
ext_left  = 27;   // -X toward frame; must be <= clear_left (>= rosette_d/2)
ext_right = 27;   // +X; symmetric with ext_left
ext_down  = 26;   // -Y toward handle; must be <= clear_down (>= rosette_d/2 + pedestal)
ext_up    = 100;  // +Y free; houses Pico + universal board (72mm, clears pedestal)

inner_l = ext_left + ext_right;          // 54
inner_w = ext_down + ext_up;             // 126
// inner_h: servo stack is the tallest — pedestal_top(42) + servo(22.5) + clearance(4) - floor wall
inner_h = pedestal_top_z + servo_body_h + wire_clearance - wall; // 66.1

body_l = inner_l + 2*wall;
body_w = inner_w + 2*wall;
body_h = inner_h + 2*wall;

// body center relative to the axis (axis sits low-left, body grows up-right)
center_x = (ext_right - ext_left) / 2;   // 0
center_y = (ext_up - ext_down) / 2;      // 37

// --- Sanity / clearance checks ---
assert(wall > 0, "wall must be positive");
assert(fit_clearance >= 0, "fit_clearance must be >= 0");
assert(ext_left <= clear_left, "left extent exceeds door clearance");
assert(ext_down <= clear_down, "down extent exceeds handle clearance");
// Realized outer extents: body outer edge from origin = body_l/2 - center_x (-X) and body_w/2 - center_y (-Y)
assert(body_l/2 - center_x <= clear_left, "realized left extent exceeds door clearance");
assert(body_w/2 - center_y <= clear_down, "realized down extent exceeds handle clearance");
assert(knob_w_top <= knob_w_base, "knob tapers base->top");
assert(knob_engage < knob_h, "engagement shallower than protrusion");

// --- Servo mount checks ---
assert(servo_screw_pilot < servo_boss_d, "pilot hole smaller than boss");
assert(rosette_d/2 + pedestal_wall_t <= ext_left, "pedestal within interior (-X)");
assert(rosette_d/2 + pedestal_wall_t <= ext_down, "pedestal within interior (-Y)");

// Horn bar slot must fit inside the knob-driven socket footprint with >=0.4mm tip wall
assert(horn_arm_l + horn_clearance + 0.4 <= (knob_w_base + knob_t)/2 + socket_wall, "horn bar slot exceeds socket footprint (tip wall < 0.4mm)");
// main file
include <../scad/params.scad>
use <../scad/socket.scad>

// taper sanity
assert(horn_arm_w_base > horn_arm_w_tip, "horn tapers base→tip");
assert(horn_clearance > 0, "positive horn clearance");

// horn fits in allocated Z
assert(horn_thick + horn_clearance <= horn_h, "horn fits pocket depth");

// hub wider than arm base — hub circle drives center width
assert(horn_hub_d >= horn_arm_w_base, "hub circle covers arm base width at center");

// bar tip has enough socket wall (>= 0.4mm)
socket_half = (knob_w_base + knob_t) / 2 + socket_wall;
assert(horn_arm_l + horn_clearance + 0.4 <= socket_half, "bar tip wall >= 0.4mm");

// pocket is strictly larger than horn in every dimension
assert(horn_hub_d + 2*horn_clearance > horn_hub_d, "hub pocket has clearance");
assert(horn_arm_w_base + 2*horn_clearance > horn_arm_w_base, "arm base pocket has clearance");
assert(horn_arm_w_tip + 2*horn_clearance > horn_arm_w_tip, "arm tip pocket has clearance");

// stub fits in horn center recess (stub_d < hub_d)
assert(horn_stub_d < horn_hub_d, "stub fits within hub recess");

thumbturn_socket();
echo("horn_fit_test ok");
